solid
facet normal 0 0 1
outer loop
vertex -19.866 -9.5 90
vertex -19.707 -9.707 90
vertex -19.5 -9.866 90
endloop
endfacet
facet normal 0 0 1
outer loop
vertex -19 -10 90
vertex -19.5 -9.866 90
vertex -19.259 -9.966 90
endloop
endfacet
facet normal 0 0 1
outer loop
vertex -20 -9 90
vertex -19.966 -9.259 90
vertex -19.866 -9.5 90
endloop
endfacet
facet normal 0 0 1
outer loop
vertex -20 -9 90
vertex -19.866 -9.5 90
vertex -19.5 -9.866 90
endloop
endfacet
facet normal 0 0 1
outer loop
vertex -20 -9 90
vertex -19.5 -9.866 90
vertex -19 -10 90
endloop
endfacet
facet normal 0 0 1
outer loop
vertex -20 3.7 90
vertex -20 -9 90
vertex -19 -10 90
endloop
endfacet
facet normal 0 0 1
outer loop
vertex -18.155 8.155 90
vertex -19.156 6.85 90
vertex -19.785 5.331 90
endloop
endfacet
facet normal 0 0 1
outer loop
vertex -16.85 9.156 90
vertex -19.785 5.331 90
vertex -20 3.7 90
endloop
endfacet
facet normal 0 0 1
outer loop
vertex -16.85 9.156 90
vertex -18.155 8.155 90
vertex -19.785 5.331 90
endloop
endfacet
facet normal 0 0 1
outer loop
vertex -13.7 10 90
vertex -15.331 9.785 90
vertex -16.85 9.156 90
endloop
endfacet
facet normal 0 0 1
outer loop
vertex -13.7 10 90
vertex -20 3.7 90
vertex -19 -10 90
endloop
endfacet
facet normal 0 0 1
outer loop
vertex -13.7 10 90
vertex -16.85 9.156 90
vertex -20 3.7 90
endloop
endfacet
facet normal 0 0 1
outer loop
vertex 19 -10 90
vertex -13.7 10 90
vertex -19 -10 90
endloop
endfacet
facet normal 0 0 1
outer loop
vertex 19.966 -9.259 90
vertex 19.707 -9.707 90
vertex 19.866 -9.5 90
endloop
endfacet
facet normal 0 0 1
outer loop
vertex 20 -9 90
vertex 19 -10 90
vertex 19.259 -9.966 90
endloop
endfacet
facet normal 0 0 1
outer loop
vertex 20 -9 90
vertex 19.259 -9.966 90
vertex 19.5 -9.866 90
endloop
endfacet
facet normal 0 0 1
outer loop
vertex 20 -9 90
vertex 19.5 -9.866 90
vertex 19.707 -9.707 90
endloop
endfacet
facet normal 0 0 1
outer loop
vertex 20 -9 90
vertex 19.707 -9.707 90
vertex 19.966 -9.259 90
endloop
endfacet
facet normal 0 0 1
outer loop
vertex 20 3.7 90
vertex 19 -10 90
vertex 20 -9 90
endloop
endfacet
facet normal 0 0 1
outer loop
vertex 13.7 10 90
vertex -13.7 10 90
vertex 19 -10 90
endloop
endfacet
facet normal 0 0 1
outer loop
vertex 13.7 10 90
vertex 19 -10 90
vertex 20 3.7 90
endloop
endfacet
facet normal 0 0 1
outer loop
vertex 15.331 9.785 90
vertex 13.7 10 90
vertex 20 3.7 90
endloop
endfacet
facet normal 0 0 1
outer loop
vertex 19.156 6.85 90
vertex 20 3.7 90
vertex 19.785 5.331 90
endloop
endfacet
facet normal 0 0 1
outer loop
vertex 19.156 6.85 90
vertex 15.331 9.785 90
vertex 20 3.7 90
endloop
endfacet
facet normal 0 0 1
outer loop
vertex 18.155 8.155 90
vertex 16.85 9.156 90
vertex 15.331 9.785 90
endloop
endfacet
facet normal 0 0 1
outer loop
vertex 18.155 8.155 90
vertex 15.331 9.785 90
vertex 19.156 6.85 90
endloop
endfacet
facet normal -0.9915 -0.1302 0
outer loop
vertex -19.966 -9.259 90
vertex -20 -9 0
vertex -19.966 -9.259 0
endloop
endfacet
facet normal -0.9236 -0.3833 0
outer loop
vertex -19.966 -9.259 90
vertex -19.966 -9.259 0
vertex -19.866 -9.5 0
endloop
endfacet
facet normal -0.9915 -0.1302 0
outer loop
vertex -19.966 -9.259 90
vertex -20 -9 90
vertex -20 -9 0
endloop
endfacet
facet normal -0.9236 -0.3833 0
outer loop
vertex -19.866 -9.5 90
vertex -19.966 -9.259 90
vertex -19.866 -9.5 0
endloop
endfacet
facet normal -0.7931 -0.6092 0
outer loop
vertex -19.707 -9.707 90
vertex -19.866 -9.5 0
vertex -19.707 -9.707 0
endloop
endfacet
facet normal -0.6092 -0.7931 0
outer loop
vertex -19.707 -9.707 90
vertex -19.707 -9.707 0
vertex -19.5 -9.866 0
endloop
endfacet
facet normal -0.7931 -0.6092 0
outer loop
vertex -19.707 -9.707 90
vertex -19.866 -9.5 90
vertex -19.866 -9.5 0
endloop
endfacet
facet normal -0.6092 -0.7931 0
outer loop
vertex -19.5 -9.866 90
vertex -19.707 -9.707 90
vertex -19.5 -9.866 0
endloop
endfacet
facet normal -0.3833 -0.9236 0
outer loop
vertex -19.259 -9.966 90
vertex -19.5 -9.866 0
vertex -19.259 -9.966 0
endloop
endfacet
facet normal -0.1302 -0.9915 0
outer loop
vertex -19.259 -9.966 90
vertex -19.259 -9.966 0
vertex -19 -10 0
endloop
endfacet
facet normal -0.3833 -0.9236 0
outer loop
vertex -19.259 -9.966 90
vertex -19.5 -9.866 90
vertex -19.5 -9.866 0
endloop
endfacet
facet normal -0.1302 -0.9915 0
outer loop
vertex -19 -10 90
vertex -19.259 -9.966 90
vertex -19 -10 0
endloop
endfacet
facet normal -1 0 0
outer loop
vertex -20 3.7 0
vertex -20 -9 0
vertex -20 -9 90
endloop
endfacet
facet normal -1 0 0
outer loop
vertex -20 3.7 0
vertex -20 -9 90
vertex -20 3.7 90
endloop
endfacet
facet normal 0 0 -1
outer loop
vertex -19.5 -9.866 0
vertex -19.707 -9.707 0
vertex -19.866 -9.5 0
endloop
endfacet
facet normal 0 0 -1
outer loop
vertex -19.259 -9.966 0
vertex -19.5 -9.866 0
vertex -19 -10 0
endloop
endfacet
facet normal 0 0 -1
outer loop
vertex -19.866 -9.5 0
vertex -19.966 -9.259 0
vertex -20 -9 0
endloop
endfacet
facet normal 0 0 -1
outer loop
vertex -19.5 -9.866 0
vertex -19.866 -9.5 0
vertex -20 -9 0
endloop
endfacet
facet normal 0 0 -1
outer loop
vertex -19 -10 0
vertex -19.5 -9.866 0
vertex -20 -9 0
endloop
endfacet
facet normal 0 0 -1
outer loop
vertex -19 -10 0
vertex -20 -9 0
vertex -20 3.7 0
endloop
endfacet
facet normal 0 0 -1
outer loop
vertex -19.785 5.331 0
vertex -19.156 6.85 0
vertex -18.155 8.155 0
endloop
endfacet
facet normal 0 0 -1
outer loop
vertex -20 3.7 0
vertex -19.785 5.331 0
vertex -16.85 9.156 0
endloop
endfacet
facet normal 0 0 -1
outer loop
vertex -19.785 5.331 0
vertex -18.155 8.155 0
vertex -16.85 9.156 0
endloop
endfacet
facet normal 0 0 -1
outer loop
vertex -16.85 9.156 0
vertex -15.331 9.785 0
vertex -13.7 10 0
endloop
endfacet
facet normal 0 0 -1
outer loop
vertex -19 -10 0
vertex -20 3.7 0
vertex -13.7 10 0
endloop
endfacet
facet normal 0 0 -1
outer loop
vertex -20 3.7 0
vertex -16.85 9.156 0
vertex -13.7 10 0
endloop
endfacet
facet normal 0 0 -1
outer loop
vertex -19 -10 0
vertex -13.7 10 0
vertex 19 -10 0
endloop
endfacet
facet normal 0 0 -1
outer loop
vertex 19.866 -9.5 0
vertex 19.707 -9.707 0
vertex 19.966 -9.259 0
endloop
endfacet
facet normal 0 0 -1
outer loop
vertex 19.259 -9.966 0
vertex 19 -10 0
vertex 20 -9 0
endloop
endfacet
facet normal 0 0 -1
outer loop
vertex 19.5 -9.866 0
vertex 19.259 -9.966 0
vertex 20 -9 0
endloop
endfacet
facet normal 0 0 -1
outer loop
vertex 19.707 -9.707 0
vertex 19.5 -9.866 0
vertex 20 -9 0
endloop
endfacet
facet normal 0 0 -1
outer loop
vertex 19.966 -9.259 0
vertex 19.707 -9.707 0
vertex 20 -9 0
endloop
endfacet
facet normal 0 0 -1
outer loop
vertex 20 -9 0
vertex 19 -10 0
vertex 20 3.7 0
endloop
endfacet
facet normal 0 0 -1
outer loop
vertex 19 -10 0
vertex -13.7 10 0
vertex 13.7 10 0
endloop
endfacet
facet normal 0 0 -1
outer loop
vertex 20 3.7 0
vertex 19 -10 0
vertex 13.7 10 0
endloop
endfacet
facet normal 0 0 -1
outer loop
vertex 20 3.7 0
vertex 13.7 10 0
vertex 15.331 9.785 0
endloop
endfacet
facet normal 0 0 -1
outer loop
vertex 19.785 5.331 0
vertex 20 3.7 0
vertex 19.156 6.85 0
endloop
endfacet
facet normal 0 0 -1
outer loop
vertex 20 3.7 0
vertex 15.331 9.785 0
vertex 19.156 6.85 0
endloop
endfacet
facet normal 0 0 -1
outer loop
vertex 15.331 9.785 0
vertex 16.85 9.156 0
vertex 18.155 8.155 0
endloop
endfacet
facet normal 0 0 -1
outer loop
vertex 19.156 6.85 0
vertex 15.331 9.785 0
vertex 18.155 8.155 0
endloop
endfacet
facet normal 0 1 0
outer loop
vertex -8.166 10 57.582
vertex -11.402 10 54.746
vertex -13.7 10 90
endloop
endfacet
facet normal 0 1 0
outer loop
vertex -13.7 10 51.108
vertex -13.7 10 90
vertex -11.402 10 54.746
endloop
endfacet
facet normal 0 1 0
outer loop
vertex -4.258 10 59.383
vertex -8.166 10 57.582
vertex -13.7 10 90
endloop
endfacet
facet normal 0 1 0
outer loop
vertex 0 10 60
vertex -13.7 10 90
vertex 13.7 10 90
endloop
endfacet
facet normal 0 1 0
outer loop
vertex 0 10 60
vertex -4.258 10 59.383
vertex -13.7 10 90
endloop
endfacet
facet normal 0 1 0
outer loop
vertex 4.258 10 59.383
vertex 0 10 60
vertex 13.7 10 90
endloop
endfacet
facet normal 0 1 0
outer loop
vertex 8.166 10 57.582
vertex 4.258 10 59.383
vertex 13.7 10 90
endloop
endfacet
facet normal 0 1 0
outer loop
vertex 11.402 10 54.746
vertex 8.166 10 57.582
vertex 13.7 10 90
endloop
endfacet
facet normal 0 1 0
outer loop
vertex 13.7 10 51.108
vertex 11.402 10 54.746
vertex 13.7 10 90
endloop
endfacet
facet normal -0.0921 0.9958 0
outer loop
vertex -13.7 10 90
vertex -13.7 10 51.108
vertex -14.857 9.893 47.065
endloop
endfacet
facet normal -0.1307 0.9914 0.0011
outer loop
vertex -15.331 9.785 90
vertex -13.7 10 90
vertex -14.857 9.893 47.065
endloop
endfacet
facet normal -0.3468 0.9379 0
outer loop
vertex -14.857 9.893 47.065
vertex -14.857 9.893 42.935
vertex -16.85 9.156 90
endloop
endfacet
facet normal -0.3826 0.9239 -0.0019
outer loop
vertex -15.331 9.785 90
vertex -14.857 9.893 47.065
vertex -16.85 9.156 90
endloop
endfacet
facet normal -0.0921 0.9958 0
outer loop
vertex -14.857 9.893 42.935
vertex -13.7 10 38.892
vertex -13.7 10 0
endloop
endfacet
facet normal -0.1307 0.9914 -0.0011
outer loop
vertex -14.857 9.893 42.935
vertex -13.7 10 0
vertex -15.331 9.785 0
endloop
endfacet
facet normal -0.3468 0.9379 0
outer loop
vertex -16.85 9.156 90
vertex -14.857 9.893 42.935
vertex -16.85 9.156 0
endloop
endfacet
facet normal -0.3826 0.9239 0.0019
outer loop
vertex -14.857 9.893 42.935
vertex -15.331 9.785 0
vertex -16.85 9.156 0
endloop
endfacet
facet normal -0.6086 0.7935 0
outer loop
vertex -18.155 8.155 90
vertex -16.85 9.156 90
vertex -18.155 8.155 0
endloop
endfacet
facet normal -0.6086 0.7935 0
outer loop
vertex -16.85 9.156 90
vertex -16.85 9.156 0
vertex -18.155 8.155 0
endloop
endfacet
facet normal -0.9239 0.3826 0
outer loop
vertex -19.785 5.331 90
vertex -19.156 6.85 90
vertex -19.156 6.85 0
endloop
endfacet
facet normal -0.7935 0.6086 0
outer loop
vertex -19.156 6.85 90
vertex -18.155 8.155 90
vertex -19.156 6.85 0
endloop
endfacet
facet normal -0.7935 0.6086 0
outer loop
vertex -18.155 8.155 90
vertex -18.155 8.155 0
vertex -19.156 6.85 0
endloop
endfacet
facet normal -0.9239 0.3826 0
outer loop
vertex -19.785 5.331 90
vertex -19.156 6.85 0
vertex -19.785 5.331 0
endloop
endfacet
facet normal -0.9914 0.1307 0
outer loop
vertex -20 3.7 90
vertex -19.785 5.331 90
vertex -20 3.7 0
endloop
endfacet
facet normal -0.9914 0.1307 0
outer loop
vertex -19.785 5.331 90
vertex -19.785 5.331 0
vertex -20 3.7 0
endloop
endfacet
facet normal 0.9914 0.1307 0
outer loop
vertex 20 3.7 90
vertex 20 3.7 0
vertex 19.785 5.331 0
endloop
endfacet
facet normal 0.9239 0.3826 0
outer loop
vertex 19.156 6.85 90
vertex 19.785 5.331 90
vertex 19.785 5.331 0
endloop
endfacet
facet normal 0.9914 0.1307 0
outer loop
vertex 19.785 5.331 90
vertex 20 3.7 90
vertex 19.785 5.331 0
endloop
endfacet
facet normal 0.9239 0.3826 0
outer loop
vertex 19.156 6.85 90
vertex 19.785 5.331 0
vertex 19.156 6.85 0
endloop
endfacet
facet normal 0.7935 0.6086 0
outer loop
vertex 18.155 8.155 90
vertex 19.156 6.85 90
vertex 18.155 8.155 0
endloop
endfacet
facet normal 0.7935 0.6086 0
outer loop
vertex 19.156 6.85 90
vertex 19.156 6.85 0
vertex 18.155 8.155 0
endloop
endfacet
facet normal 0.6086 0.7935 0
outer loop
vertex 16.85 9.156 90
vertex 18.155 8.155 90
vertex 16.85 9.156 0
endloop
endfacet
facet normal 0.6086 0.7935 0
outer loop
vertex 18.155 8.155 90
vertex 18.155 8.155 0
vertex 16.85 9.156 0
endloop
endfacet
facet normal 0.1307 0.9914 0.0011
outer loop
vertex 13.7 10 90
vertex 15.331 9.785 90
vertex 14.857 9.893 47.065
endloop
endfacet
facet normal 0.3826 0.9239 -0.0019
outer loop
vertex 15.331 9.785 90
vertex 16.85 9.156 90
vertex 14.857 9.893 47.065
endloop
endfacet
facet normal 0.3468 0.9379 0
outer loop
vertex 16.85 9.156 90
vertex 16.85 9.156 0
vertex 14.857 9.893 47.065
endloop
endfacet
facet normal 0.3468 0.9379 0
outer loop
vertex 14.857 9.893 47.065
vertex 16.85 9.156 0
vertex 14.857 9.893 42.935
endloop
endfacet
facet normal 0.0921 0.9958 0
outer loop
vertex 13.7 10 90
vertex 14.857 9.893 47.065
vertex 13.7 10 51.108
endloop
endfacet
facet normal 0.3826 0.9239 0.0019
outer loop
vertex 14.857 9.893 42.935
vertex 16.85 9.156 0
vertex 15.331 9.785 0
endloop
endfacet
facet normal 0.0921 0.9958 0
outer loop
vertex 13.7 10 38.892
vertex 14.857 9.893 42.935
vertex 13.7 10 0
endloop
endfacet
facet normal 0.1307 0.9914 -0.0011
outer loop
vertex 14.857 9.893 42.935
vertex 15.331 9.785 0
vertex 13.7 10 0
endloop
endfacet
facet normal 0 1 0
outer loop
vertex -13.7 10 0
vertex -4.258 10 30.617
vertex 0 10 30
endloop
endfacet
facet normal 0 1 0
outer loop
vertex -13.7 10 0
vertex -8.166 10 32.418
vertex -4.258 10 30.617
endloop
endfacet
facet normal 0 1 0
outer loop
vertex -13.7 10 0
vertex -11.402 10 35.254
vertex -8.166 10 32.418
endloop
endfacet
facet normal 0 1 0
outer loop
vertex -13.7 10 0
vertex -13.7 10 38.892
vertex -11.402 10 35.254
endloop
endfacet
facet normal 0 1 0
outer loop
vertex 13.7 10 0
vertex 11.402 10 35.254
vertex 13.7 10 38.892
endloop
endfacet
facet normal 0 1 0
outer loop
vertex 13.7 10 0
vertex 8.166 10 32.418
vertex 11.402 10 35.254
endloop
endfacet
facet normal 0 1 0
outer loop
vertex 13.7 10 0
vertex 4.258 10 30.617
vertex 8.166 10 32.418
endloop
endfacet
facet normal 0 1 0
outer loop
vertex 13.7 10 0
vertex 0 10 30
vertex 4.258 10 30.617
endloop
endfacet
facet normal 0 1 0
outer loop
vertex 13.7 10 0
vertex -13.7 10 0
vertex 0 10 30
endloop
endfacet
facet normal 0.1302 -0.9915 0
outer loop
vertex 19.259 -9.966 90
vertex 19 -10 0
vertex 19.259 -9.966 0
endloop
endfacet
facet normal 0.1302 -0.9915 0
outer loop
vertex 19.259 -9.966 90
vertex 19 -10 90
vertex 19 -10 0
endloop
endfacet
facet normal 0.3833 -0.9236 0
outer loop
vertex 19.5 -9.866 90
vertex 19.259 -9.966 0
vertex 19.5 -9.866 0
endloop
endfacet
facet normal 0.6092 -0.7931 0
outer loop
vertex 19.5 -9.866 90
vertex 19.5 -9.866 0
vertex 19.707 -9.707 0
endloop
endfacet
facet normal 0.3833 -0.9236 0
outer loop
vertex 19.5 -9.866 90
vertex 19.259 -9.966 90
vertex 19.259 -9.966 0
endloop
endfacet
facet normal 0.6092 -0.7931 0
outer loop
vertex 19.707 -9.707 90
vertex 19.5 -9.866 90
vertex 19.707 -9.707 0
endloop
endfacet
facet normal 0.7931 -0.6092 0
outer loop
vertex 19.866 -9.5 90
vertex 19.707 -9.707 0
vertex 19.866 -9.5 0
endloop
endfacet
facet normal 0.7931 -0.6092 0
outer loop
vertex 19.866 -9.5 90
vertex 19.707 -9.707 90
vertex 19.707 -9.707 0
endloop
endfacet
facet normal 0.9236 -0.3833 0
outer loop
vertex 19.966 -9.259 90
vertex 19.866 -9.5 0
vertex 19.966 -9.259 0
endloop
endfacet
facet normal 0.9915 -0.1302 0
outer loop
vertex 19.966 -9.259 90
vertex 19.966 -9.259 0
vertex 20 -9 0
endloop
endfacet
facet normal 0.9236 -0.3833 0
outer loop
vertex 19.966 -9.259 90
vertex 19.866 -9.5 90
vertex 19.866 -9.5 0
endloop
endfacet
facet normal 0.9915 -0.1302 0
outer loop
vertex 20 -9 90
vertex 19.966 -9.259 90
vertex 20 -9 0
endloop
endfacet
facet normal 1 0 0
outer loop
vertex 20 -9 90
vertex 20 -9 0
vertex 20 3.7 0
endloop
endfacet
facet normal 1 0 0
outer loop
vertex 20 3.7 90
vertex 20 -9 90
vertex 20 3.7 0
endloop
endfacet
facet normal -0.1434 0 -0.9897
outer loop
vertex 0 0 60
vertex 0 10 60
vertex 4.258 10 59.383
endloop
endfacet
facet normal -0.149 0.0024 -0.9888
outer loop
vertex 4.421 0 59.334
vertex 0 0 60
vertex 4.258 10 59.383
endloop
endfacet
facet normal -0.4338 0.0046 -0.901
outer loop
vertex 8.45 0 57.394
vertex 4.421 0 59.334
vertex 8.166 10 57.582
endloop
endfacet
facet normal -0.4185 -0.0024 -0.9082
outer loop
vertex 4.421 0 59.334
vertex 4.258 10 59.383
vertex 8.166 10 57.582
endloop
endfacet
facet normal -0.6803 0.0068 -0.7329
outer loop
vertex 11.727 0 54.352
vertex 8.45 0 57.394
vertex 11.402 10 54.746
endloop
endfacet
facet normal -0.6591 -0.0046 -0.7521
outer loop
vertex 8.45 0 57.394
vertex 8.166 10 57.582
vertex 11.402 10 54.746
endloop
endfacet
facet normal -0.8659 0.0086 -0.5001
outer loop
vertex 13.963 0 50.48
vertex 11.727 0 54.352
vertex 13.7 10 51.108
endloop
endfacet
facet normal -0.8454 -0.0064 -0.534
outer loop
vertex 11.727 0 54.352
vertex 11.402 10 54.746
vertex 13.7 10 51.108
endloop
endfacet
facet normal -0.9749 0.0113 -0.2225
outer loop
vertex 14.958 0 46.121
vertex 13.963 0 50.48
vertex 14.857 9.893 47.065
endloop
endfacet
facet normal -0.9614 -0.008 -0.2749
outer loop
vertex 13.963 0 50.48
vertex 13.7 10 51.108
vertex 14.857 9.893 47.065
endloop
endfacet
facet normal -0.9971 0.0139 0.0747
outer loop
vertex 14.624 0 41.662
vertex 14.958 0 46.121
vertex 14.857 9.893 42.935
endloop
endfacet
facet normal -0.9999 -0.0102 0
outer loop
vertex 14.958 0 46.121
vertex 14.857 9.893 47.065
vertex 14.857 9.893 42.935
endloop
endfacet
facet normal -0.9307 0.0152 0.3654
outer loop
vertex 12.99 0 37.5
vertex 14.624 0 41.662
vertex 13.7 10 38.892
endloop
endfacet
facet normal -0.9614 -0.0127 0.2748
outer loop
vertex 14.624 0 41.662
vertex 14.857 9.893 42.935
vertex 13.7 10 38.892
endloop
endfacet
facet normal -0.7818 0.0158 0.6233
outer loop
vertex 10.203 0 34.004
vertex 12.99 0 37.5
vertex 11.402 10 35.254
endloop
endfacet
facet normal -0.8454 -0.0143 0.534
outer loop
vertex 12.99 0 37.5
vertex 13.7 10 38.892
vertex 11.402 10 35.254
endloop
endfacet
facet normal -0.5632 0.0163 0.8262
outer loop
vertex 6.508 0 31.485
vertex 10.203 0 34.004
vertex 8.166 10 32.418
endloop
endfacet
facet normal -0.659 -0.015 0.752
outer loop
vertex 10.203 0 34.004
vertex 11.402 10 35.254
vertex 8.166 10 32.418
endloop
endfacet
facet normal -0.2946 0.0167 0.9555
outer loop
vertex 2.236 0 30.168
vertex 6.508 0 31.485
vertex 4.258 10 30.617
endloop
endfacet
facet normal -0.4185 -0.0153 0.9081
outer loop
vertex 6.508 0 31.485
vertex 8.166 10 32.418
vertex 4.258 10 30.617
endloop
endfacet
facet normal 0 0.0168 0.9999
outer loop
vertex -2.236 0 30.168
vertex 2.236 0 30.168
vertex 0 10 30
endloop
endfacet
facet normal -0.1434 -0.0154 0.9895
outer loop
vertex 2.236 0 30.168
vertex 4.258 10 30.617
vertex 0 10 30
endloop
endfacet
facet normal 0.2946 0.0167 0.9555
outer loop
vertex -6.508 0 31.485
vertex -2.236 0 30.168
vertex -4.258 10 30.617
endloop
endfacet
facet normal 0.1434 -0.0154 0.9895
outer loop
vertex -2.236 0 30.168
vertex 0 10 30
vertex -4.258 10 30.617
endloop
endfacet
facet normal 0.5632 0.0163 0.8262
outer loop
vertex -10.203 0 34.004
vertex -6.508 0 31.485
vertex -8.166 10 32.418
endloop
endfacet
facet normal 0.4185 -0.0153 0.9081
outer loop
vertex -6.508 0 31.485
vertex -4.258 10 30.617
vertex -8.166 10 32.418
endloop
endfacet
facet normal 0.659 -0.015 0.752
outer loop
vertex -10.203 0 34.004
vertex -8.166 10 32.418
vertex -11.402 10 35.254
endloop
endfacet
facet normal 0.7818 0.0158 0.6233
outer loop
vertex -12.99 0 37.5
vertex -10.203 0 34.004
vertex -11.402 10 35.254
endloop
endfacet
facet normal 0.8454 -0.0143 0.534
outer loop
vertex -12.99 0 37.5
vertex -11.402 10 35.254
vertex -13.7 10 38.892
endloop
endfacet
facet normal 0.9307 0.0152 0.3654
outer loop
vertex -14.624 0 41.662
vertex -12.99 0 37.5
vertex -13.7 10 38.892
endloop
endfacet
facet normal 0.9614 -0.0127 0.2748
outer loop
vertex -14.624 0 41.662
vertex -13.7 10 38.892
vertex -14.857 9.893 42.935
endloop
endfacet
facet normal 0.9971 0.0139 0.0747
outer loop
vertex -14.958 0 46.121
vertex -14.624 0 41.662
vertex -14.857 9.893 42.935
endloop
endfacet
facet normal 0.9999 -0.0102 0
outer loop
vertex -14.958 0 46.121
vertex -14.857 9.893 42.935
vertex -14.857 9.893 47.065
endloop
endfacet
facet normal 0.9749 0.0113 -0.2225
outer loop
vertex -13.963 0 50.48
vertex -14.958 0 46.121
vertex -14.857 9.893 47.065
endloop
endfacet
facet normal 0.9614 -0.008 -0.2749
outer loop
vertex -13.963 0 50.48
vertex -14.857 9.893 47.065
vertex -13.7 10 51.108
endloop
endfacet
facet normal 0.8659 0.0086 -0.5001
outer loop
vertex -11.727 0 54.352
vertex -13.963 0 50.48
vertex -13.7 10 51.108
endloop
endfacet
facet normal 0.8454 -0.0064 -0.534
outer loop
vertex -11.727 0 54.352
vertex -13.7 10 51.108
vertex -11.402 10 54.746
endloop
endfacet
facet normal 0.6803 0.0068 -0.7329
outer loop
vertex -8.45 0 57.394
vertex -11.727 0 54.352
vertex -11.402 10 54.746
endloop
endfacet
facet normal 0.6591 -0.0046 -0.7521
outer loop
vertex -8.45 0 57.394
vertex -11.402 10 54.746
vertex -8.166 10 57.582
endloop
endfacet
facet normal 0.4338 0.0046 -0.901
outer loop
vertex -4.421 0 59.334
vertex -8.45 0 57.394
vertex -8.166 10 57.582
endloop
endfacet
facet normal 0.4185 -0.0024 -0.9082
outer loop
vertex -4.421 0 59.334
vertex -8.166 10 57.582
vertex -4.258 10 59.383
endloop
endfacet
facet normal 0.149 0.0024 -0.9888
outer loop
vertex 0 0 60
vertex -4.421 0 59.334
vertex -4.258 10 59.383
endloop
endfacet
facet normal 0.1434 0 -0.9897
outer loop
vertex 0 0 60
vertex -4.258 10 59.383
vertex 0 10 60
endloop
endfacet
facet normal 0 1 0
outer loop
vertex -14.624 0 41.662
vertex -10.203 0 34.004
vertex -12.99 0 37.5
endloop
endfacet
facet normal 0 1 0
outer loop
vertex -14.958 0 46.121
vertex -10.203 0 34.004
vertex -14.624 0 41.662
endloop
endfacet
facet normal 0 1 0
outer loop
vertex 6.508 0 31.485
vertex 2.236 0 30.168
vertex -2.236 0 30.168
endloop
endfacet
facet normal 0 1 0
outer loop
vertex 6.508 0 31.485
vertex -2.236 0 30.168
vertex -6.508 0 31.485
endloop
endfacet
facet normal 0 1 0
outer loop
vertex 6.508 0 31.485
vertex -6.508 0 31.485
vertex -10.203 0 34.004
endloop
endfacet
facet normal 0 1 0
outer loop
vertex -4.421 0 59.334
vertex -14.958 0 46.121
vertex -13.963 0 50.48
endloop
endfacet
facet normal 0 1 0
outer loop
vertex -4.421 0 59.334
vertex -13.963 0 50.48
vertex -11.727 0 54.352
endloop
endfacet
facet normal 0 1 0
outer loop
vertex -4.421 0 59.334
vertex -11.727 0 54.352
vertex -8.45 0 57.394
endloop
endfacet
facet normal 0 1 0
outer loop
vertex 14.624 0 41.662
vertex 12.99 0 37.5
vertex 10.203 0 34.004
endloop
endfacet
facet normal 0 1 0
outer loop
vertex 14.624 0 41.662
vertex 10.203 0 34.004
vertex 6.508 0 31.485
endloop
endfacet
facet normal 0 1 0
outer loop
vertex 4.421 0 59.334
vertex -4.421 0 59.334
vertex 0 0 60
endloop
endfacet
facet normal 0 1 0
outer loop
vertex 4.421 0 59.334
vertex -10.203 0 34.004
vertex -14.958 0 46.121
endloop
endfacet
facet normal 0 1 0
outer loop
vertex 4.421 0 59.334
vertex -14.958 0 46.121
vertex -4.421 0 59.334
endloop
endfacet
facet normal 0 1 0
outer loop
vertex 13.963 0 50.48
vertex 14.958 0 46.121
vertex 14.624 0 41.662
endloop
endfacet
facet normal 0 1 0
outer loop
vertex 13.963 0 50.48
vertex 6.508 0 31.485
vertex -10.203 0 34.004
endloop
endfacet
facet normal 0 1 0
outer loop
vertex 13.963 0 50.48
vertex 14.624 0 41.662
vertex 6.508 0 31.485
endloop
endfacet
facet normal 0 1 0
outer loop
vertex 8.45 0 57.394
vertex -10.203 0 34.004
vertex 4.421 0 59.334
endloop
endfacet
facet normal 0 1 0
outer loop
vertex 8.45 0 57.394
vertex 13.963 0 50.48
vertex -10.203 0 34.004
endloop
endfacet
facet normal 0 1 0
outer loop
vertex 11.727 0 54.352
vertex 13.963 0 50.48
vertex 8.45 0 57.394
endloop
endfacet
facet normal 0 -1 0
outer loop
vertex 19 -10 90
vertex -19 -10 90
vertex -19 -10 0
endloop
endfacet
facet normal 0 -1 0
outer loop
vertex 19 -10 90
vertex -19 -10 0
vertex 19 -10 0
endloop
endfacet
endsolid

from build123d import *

# Parameters (mm, degrees)
SKETCH1_W           = 40
SKETCH1_H           = 20
BOSS_EXTRUDE1_DEPTH = 90
FILLET1_R           = 1
SKETCH2_R           = 15
CUT_EXTRUDE1_DEPTH  = 10
FILLET2_R           = 6.3


with BuildPart() as part:
    # Sketch1 → Boss-Extrude1 (new body)
    with BuildSketch(Plane.XY):
        Rectangle(SKETCH1_W, SKETCH1_H)
    extrude(amount=BOSS_EXTRUDE1_DEPTH)

    # Fillet1
    fillet1_edges = [part.edges().sort_by_distance(p)[0] for p in [
        (20, -10, 45),
        (-20, -10, 45),
    ]]
    fillet(fillet1_edges, radius=FILLET1_R)

    # Sketch2 → Cut-Extrude1 (cut)
    with BuildSketch(Plane(origin=(0, 10, 0), x_dir=(1, 0, 0), z_dir=(0, 1, 0))):
        with Locations(Location((0, -45, 0), (0, 0, 270))):
            Circle(SKETCH2_R)
    extrude(amount=-CUT_EXTRUDE1_DEPTH, mode=Mode.SUBTRACT)

    # Fillet2
    # the kernel refuses this fillet: 6.3 mm, written as the material it takes off along each edge
    with BuildSketch(Plane(origin=(-20, 10, -15.75), x_dir=(0, -1, 0), z_dir=(0, 0, 1))) as fillet2_piece_1:
        with BuildLine():
            CenterArc((FILLET2_R, FILLET2_R), FILLET2_R, 180, 90)
            Line((0, FILLET2_R), (0, 0))
            Line((0, 0), (FILLET2_R, 0))
        make_face()
    extrude(amount=121.5, mode=Mode.SUBTRACT)
    with BuildSketch(Plane(origin=(20, 10, -15.75), x_dir=(0, -1, 0), z_dir=(0, 0, 1))) as fillet2_piece_2:
        with BuildLine():
            CenterArc((FILLET2_R, -FILLET2_R), FILLET2_R, 90, 90)
            Line((0, -FILLET2_R), (0, 0))
            Line((0, 0), (FILLET2_R, 0))
        make_face()
    extrude(amount=121.5, mode=Mode.SUBTRACT)


solid = part.part
